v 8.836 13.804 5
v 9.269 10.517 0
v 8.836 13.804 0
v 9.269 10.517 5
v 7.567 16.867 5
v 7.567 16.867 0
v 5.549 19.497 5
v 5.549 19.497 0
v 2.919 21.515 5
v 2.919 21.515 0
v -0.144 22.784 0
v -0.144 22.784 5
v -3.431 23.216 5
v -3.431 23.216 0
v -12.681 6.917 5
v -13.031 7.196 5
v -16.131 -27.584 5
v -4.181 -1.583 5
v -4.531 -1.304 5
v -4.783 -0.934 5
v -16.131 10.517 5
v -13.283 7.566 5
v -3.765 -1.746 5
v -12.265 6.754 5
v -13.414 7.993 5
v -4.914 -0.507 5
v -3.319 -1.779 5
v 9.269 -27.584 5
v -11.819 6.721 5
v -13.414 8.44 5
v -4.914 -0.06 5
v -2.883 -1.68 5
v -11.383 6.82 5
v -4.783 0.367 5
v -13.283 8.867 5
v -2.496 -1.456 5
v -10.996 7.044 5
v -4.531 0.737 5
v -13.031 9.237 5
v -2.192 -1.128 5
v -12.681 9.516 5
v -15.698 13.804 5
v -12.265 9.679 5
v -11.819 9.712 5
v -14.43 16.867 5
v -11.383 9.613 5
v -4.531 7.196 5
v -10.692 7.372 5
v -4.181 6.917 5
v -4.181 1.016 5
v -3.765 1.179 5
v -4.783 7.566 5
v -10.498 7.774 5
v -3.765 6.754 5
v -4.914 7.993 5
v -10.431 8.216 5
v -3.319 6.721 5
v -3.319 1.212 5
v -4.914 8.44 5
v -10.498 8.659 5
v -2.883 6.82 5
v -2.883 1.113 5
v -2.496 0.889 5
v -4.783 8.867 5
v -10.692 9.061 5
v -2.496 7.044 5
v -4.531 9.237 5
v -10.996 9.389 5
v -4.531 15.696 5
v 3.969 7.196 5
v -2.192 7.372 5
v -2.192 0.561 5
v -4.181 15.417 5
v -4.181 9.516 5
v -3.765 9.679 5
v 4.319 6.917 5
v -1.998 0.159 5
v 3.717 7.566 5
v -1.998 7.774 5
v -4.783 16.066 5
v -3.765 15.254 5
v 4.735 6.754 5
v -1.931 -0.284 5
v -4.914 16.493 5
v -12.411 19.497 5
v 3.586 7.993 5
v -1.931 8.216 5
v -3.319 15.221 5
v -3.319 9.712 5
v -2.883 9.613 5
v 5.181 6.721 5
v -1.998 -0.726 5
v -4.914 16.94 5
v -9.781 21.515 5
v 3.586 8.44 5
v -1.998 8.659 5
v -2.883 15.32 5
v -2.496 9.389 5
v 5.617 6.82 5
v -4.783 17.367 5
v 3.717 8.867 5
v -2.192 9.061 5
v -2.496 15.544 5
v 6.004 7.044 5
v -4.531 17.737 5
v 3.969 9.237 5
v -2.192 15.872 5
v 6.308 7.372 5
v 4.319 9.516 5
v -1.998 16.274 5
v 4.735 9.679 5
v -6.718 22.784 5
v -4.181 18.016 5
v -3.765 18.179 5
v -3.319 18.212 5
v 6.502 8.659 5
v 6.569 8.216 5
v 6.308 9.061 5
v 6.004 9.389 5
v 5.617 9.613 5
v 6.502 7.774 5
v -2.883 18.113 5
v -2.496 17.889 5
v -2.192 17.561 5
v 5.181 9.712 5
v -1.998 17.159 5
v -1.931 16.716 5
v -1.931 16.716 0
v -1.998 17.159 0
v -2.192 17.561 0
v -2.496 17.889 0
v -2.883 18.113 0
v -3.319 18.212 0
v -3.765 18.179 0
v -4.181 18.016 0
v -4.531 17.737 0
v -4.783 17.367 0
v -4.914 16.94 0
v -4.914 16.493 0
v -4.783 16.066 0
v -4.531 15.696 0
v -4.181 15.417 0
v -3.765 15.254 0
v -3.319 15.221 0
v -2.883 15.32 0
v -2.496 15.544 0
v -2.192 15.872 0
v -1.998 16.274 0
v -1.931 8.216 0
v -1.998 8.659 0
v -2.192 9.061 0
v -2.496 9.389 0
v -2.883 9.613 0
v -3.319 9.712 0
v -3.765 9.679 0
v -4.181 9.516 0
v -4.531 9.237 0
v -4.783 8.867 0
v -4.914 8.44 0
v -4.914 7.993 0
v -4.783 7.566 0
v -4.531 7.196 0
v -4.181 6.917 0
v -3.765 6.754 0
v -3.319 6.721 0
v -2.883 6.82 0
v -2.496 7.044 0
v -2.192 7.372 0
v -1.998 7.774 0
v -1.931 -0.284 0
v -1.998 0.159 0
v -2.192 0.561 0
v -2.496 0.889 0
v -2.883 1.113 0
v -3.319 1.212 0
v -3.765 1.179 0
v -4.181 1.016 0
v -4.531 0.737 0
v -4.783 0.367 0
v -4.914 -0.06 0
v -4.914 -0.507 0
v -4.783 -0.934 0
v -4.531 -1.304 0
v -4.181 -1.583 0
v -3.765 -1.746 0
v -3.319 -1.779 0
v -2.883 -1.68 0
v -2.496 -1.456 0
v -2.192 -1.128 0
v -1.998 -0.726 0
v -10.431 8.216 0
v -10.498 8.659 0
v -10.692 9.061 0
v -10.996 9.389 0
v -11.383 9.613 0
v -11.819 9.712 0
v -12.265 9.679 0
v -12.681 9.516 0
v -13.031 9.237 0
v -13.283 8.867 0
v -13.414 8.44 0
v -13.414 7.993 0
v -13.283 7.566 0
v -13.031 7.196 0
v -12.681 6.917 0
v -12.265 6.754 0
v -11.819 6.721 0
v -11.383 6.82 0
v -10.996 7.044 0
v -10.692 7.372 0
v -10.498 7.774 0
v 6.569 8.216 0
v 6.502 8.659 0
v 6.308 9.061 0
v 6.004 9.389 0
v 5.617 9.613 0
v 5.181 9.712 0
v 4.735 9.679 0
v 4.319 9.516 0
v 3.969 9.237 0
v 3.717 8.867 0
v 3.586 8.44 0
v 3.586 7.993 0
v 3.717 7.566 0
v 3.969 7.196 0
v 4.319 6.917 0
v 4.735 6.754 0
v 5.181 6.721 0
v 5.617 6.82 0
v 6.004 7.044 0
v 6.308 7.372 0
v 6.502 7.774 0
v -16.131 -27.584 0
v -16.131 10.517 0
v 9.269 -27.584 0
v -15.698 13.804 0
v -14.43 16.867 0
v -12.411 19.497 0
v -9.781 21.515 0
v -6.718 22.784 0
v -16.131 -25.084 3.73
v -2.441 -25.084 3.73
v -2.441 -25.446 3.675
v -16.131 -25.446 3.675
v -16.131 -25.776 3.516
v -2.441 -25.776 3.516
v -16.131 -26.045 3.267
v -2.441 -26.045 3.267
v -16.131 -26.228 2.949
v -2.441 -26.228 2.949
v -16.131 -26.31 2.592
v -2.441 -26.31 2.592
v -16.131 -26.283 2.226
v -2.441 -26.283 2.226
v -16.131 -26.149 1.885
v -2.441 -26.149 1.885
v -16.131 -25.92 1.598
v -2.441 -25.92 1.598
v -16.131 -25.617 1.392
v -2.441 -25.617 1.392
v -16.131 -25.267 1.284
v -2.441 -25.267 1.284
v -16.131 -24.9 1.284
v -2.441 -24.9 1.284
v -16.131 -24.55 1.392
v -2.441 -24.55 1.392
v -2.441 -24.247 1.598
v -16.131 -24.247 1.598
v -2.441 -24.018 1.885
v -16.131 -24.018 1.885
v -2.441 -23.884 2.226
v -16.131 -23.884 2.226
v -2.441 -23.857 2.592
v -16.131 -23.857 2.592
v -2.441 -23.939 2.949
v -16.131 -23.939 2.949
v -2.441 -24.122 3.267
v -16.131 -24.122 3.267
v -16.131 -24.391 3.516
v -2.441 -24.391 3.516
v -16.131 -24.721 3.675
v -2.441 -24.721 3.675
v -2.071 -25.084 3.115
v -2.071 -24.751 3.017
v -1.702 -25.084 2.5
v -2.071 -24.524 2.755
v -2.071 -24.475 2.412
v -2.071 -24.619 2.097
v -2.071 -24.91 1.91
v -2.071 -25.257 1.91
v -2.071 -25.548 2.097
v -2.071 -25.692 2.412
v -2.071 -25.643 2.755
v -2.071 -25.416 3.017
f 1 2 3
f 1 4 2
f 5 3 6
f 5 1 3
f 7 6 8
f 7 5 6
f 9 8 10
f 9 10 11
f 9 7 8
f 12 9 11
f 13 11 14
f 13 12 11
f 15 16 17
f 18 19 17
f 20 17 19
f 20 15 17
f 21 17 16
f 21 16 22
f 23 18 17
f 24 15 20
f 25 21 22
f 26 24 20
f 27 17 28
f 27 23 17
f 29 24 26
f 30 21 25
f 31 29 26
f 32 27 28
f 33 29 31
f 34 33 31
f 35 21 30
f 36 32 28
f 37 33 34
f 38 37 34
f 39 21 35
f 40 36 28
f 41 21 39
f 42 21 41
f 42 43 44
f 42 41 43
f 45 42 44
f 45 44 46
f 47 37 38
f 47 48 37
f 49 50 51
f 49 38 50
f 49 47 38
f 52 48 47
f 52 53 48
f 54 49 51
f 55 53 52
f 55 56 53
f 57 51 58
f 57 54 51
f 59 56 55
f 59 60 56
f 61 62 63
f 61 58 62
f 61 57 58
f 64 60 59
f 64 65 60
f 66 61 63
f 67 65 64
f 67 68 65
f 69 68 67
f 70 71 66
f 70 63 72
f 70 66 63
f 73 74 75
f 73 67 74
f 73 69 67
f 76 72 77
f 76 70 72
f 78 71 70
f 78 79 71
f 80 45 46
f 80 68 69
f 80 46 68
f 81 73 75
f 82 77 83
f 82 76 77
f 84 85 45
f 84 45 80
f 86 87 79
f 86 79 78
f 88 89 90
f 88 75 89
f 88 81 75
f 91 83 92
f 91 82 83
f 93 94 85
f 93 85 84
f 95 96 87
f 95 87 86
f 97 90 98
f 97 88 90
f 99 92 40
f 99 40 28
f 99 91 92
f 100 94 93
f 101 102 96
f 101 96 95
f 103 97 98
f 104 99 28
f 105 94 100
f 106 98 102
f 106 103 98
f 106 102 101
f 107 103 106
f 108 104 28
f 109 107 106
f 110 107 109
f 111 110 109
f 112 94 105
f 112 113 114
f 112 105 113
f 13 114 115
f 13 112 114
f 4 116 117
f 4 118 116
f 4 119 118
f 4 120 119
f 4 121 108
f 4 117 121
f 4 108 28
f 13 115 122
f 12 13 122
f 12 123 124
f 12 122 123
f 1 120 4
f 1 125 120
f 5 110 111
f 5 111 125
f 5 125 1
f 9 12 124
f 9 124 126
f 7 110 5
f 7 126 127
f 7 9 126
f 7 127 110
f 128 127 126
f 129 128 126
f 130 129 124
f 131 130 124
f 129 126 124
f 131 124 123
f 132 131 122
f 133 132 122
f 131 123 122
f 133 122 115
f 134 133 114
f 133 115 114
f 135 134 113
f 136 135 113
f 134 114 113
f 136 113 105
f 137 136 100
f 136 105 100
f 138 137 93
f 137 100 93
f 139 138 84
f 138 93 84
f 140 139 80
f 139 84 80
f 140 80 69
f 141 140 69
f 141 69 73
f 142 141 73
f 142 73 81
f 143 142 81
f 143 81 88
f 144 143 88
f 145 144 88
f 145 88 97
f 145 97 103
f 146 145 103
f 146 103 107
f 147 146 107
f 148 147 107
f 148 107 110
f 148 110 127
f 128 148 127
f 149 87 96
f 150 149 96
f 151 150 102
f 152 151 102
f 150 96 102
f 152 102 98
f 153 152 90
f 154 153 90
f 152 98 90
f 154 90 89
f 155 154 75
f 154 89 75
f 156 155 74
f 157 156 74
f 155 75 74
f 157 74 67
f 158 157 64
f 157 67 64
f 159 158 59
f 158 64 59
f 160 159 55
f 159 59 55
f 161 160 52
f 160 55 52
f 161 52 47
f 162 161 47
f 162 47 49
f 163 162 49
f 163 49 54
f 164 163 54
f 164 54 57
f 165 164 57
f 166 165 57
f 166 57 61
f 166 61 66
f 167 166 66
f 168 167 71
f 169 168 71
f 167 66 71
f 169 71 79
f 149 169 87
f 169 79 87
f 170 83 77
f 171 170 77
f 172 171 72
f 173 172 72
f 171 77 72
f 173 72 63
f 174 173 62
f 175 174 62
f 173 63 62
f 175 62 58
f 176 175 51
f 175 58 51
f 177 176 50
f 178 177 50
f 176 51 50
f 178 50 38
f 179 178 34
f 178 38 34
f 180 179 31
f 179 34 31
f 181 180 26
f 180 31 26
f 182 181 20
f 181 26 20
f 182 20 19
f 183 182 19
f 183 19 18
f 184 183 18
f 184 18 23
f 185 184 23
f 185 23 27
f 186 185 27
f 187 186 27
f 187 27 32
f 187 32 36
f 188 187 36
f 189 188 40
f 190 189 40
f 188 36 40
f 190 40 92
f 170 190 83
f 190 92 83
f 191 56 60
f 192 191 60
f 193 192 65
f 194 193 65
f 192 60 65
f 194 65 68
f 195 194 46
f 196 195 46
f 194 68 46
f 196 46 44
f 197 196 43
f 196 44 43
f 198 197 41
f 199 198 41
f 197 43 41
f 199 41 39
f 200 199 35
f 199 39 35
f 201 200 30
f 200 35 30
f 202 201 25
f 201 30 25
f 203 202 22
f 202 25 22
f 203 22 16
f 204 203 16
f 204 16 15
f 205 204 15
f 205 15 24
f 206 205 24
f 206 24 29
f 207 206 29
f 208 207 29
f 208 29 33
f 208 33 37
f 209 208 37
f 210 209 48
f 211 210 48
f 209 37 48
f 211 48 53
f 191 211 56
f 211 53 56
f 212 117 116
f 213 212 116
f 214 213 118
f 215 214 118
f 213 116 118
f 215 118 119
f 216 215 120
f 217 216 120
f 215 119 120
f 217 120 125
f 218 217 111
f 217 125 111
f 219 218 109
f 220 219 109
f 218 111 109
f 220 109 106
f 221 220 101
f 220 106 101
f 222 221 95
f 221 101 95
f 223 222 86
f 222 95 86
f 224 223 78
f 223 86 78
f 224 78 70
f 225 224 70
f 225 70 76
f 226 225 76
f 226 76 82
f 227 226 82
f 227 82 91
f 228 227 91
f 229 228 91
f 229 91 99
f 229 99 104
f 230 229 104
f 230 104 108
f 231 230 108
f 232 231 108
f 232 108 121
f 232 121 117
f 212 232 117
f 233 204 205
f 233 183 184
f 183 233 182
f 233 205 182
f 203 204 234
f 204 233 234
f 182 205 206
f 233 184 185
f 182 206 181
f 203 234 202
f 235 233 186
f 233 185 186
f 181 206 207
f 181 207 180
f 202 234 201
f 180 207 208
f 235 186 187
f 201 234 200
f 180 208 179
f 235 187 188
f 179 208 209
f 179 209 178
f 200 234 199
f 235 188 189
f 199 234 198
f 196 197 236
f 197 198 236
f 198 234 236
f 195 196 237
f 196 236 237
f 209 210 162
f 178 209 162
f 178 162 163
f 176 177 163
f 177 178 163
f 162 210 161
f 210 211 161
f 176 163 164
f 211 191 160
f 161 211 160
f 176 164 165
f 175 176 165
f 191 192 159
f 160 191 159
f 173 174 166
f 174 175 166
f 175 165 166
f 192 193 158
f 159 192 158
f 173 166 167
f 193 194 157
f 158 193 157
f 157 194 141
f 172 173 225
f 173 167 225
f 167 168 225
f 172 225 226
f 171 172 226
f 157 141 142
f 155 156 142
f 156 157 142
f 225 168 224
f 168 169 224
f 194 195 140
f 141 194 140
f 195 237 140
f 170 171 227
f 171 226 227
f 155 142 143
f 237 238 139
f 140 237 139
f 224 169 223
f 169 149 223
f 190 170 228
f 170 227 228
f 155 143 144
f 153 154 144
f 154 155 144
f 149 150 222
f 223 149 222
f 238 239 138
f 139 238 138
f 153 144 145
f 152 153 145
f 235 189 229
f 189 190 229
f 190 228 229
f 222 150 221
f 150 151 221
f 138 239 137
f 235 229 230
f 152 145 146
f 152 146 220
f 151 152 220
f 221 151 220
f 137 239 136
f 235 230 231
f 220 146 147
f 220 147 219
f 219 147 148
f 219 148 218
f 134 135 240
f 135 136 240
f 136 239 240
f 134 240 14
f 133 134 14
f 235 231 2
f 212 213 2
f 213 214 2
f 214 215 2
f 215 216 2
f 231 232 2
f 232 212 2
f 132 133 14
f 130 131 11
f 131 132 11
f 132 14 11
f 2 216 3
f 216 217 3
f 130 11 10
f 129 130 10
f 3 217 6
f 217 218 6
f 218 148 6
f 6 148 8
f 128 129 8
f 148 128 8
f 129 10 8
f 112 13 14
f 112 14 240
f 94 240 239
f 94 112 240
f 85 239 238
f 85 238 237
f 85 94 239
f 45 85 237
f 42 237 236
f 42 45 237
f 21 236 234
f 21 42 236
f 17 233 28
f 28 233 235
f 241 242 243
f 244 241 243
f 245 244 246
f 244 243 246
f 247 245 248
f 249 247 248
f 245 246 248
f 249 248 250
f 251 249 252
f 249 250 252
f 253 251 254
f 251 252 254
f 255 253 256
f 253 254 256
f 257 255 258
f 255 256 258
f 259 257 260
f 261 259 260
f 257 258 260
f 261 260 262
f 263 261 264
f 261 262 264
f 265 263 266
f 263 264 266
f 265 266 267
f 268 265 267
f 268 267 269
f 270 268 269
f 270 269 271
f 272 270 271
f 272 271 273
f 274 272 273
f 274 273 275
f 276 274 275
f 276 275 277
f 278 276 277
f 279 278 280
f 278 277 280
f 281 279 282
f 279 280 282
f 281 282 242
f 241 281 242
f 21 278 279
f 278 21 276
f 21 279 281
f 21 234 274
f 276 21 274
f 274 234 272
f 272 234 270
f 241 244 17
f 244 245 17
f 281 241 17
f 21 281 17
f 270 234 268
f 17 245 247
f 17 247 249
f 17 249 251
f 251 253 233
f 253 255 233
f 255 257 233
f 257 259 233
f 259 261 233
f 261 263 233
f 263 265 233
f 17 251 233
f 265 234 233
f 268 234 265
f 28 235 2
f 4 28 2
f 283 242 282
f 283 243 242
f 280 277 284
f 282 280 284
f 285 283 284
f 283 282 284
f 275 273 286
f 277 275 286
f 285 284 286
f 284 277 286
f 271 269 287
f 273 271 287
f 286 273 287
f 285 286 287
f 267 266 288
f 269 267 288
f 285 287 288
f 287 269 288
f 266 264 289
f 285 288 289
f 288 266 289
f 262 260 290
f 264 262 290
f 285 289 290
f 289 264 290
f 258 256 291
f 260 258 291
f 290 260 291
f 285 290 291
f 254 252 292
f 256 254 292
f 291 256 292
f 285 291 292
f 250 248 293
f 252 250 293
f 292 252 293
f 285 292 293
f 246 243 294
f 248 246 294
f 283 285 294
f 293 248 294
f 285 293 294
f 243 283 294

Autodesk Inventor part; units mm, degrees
ref_plane "YZ Plane" through (0, 0, 0) normal (1, 0, 0) x (0, 1, 0)
ref_plane "XZ Plane" through (0, 0, 0) normal (0, 1, 0) x (-1, 0, 0)
ref_plane "XY Plane" through (0, 0, 0) normal (0, 0, 1) x (1, 0, 0)
sketch "Sketch1" plane through (0, 0, 0) normal (0, 0, 1) x (1, 0, 0)
  line L0 (9.2688, 23.2165) -> (-16.1312, 23.2165)
  line L1 (-16.1312, 23.2165) -> (-16.1312, -27.5835)
  line L2 (-16.1312, -27.5835) -> (9.2688, -27.5835)
  line L3 (9.2688, -27.5835) -> (9.2688, 23.2165)
  point P0 (0, 0)
  dimension "d0" = 25.4
  dimension "d1" = 50.8
extrude "Extrusion1" add sketch "Sketch1" along normal blind 5
sketch "Sketch2" plane through (0, 0, 5) normal (0, 0, 1) x (1, 0, 0)
  circle A0 centre (-3.4312, 8.2165) radius 12.3 construction
  circle A1 centre (-3.4312, 8.2165) radius 8.5 construction
  circle A2 centre (-11.9312, 8.2165) radius 1.5
  circle A3 centre (-3.4312, 8.2165) radius 1.5
  circle A4 centre (-3.4312, -0.2835) radius 1.5
  circle A5 centre (5.0688, 8.2165) radius 1.5
  circle A6 centre (-3.4312, 16.7165) radius 1.5
  line L0 (9.2688, 23.2165) -> (-16.1312, 23.2165) projected
  point P0 (0, 0)
  point P1 (-3.4312, 23.2165)
  dimension "d5" = 17
  dimension "d4" = 24.6
  dimension "d6" = 3
  dimension "d7" = 3
  dimension "d10" = 360
  dimension "d12" = 15
extrude "Extrusion2" cut sketch "Sketch2" against normal up to next
sketch "Sketch3" plane through (-16.1312, -27.5835, 0) normal (-1, 0, 0) x (0, 0, 1)
  line L0 (0, 0) -> (5, 0) projected
  point P0 (0, 27.5835)
  point P1 (2.5, 2.5)
  point P2 (2.5, 0)
  dimension "d15" = 2.5
hole "Hole1" at (-16.1312, -25.0835, 2.5) direction (1, 0, 0) diameter 2.46 depth 13.6906 tip angle 118
full round fillet "Fillet1" first side at (-16.1312, 7.5235, 2.4506) centre faces at (0.8021, 23.2165, 3.3333) second side at (9.2688, -10.6502, 1.6667)
properties part number "Tilt_Camera_Side_Plate"
